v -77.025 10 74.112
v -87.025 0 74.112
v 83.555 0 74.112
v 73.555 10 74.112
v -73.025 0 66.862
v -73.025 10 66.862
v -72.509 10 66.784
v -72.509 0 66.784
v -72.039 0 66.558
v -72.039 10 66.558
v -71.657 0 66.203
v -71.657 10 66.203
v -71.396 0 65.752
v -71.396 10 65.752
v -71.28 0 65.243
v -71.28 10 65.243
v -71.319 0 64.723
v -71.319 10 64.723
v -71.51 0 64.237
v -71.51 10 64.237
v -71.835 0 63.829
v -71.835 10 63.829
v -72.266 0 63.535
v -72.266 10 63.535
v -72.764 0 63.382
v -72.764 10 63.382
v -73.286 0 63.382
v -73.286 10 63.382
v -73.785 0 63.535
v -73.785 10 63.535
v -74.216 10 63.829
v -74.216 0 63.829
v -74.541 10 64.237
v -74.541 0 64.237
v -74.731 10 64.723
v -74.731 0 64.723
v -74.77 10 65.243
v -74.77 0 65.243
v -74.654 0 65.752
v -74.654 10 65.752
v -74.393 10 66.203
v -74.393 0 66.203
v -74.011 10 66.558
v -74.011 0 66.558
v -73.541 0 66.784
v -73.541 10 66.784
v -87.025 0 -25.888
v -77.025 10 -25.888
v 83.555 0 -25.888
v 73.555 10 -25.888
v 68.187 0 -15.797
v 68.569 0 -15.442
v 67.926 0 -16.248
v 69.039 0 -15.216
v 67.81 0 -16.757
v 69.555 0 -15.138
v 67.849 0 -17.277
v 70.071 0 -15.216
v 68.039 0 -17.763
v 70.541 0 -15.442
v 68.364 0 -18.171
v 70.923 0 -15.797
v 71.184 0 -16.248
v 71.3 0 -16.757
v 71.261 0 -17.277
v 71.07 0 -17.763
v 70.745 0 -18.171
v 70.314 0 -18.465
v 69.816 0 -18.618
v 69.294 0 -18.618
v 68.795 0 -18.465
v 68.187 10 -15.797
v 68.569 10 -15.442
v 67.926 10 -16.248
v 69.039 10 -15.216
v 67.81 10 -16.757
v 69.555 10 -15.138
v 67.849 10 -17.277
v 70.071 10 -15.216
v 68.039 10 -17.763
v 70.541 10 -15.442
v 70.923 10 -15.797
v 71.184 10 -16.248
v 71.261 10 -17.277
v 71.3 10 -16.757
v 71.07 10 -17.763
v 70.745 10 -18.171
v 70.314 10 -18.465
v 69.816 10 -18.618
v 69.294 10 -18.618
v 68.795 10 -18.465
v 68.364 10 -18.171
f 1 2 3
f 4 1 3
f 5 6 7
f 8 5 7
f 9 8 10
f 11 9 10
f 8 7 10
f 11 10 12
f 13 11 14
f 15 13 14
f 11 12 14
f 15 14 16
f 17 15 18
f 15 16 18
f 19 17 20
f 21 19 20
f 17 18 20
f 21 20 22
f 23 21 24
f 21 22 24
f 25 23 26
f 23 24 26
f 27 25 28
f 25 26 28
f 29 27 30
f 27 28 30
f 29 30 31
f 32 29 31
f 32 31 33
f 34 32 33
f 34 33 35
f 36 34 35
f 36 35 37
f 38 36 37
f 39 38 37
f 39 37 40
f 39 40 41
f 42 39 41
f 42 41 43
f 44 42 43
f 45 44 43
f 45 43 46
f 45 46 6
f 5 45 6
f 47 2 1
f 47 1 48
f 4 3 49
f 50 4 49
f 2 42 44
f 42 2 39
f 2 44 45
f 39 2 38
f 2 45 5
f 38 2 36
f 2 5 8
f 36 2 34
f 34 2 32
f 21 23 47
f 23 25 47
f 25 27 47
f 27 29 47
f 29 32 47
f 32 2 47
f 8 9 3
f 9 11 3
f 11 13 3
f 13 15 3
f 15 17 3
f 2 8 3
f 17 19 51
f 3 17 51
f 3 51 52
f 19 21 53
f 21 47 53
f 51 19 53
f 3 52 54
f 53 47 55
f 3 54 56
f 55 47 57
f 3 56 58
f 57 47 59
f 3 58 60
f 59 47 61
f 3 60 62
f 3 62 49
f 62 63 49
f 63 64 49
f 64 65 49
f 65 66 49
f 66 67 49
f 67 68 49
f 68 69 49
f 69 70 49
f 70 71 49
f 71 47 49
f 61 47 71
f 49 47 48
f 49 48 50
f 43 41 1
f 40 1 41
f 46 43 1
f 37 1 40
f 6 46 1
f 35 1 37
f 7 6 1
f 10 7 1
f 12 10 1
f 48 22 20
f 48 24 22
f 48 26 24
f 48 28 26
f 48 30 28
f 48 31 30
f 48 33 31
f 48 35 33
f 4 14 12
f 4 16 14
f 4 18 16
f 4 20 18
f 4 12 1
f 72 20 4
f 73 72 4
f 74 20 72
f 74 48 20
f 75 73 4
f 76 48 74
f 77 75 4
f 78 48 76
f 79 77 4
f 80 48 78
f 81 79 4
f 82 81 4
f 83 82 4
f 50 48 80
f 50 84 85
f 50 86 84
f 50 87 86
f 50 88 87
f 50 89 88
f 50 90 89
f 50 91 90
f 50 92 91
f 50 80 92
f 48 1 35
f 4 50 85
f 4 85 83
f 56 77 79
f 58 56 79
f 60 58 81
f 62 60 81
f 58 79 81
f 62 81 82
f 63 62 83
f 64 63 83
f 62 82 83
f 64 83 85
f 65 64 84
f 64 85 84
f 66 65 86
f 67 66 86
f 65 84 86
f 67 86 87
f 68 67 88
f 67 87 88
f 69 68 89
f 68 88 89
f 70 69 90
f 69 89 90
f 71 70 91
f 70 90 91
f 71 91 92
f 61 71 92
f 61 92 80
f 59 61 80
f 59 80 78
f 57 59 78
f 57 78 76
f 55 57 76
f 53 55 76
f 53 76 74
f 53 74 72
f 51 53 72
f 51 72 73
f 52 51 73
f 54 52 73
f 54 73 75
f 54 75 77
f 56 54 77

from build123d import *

# Parameters (mm, degrees)
SKETCH3_W           = 150.58
SKETCH3_H           = 100
BOSS_EXTRUDE1_DEPTH = 10
DRAFT1_ANGLE        = 45
SKETCH4_R           = 1.75
CUT_EXTRUDE1_DEPTH  = 15


with BuildPart() as part:
    # Sketch3 → Boss-Extrude1 (new body)
    with BuildSketch(Plane(origin=(0, 0, 0), x_dir=(1, 0, 0), z_dir=(0, 1, 0))):
        with Locations((-1.73528017, -24.11217163)):
            Rectangle(SKETCH3_W, SKETCH3_H)
    extrude(amount=BOSS_EXTRUDE1_DEPTH)

    # Draft1
    draft1_faces = [part.faces().sort_by_distance(p)[0] for p in [
        (73.55471983, 5, 24.11217163),
        (-77.02528017, 5, 24.11217163),
    ]]
    draft(draft1_faces, Plane.ZX.offset(10), DRAFT1_ANGLE)

    # Sketch4 → Cut-Extrude1 (cut)
    with BuildSketch(Plane(origin=(0, 10, 0), x_dir=(1, 0, 0), z_dir=(0, 1, 0))):
        with Locations(Location((69.55471983, 16.88782837, 0), (0, 0, 270))):
            Circle(SKETCH4_R)
        with Locations(Location((-73.02528017, -65.11217163, 0), (0, 0, 270))):
            Circle(SKETCH4_R)
    extrude(amount=-CUT_EXTRUDE1_DEPTH, mode=Mode.SUBTRACT)


solid = part.part
